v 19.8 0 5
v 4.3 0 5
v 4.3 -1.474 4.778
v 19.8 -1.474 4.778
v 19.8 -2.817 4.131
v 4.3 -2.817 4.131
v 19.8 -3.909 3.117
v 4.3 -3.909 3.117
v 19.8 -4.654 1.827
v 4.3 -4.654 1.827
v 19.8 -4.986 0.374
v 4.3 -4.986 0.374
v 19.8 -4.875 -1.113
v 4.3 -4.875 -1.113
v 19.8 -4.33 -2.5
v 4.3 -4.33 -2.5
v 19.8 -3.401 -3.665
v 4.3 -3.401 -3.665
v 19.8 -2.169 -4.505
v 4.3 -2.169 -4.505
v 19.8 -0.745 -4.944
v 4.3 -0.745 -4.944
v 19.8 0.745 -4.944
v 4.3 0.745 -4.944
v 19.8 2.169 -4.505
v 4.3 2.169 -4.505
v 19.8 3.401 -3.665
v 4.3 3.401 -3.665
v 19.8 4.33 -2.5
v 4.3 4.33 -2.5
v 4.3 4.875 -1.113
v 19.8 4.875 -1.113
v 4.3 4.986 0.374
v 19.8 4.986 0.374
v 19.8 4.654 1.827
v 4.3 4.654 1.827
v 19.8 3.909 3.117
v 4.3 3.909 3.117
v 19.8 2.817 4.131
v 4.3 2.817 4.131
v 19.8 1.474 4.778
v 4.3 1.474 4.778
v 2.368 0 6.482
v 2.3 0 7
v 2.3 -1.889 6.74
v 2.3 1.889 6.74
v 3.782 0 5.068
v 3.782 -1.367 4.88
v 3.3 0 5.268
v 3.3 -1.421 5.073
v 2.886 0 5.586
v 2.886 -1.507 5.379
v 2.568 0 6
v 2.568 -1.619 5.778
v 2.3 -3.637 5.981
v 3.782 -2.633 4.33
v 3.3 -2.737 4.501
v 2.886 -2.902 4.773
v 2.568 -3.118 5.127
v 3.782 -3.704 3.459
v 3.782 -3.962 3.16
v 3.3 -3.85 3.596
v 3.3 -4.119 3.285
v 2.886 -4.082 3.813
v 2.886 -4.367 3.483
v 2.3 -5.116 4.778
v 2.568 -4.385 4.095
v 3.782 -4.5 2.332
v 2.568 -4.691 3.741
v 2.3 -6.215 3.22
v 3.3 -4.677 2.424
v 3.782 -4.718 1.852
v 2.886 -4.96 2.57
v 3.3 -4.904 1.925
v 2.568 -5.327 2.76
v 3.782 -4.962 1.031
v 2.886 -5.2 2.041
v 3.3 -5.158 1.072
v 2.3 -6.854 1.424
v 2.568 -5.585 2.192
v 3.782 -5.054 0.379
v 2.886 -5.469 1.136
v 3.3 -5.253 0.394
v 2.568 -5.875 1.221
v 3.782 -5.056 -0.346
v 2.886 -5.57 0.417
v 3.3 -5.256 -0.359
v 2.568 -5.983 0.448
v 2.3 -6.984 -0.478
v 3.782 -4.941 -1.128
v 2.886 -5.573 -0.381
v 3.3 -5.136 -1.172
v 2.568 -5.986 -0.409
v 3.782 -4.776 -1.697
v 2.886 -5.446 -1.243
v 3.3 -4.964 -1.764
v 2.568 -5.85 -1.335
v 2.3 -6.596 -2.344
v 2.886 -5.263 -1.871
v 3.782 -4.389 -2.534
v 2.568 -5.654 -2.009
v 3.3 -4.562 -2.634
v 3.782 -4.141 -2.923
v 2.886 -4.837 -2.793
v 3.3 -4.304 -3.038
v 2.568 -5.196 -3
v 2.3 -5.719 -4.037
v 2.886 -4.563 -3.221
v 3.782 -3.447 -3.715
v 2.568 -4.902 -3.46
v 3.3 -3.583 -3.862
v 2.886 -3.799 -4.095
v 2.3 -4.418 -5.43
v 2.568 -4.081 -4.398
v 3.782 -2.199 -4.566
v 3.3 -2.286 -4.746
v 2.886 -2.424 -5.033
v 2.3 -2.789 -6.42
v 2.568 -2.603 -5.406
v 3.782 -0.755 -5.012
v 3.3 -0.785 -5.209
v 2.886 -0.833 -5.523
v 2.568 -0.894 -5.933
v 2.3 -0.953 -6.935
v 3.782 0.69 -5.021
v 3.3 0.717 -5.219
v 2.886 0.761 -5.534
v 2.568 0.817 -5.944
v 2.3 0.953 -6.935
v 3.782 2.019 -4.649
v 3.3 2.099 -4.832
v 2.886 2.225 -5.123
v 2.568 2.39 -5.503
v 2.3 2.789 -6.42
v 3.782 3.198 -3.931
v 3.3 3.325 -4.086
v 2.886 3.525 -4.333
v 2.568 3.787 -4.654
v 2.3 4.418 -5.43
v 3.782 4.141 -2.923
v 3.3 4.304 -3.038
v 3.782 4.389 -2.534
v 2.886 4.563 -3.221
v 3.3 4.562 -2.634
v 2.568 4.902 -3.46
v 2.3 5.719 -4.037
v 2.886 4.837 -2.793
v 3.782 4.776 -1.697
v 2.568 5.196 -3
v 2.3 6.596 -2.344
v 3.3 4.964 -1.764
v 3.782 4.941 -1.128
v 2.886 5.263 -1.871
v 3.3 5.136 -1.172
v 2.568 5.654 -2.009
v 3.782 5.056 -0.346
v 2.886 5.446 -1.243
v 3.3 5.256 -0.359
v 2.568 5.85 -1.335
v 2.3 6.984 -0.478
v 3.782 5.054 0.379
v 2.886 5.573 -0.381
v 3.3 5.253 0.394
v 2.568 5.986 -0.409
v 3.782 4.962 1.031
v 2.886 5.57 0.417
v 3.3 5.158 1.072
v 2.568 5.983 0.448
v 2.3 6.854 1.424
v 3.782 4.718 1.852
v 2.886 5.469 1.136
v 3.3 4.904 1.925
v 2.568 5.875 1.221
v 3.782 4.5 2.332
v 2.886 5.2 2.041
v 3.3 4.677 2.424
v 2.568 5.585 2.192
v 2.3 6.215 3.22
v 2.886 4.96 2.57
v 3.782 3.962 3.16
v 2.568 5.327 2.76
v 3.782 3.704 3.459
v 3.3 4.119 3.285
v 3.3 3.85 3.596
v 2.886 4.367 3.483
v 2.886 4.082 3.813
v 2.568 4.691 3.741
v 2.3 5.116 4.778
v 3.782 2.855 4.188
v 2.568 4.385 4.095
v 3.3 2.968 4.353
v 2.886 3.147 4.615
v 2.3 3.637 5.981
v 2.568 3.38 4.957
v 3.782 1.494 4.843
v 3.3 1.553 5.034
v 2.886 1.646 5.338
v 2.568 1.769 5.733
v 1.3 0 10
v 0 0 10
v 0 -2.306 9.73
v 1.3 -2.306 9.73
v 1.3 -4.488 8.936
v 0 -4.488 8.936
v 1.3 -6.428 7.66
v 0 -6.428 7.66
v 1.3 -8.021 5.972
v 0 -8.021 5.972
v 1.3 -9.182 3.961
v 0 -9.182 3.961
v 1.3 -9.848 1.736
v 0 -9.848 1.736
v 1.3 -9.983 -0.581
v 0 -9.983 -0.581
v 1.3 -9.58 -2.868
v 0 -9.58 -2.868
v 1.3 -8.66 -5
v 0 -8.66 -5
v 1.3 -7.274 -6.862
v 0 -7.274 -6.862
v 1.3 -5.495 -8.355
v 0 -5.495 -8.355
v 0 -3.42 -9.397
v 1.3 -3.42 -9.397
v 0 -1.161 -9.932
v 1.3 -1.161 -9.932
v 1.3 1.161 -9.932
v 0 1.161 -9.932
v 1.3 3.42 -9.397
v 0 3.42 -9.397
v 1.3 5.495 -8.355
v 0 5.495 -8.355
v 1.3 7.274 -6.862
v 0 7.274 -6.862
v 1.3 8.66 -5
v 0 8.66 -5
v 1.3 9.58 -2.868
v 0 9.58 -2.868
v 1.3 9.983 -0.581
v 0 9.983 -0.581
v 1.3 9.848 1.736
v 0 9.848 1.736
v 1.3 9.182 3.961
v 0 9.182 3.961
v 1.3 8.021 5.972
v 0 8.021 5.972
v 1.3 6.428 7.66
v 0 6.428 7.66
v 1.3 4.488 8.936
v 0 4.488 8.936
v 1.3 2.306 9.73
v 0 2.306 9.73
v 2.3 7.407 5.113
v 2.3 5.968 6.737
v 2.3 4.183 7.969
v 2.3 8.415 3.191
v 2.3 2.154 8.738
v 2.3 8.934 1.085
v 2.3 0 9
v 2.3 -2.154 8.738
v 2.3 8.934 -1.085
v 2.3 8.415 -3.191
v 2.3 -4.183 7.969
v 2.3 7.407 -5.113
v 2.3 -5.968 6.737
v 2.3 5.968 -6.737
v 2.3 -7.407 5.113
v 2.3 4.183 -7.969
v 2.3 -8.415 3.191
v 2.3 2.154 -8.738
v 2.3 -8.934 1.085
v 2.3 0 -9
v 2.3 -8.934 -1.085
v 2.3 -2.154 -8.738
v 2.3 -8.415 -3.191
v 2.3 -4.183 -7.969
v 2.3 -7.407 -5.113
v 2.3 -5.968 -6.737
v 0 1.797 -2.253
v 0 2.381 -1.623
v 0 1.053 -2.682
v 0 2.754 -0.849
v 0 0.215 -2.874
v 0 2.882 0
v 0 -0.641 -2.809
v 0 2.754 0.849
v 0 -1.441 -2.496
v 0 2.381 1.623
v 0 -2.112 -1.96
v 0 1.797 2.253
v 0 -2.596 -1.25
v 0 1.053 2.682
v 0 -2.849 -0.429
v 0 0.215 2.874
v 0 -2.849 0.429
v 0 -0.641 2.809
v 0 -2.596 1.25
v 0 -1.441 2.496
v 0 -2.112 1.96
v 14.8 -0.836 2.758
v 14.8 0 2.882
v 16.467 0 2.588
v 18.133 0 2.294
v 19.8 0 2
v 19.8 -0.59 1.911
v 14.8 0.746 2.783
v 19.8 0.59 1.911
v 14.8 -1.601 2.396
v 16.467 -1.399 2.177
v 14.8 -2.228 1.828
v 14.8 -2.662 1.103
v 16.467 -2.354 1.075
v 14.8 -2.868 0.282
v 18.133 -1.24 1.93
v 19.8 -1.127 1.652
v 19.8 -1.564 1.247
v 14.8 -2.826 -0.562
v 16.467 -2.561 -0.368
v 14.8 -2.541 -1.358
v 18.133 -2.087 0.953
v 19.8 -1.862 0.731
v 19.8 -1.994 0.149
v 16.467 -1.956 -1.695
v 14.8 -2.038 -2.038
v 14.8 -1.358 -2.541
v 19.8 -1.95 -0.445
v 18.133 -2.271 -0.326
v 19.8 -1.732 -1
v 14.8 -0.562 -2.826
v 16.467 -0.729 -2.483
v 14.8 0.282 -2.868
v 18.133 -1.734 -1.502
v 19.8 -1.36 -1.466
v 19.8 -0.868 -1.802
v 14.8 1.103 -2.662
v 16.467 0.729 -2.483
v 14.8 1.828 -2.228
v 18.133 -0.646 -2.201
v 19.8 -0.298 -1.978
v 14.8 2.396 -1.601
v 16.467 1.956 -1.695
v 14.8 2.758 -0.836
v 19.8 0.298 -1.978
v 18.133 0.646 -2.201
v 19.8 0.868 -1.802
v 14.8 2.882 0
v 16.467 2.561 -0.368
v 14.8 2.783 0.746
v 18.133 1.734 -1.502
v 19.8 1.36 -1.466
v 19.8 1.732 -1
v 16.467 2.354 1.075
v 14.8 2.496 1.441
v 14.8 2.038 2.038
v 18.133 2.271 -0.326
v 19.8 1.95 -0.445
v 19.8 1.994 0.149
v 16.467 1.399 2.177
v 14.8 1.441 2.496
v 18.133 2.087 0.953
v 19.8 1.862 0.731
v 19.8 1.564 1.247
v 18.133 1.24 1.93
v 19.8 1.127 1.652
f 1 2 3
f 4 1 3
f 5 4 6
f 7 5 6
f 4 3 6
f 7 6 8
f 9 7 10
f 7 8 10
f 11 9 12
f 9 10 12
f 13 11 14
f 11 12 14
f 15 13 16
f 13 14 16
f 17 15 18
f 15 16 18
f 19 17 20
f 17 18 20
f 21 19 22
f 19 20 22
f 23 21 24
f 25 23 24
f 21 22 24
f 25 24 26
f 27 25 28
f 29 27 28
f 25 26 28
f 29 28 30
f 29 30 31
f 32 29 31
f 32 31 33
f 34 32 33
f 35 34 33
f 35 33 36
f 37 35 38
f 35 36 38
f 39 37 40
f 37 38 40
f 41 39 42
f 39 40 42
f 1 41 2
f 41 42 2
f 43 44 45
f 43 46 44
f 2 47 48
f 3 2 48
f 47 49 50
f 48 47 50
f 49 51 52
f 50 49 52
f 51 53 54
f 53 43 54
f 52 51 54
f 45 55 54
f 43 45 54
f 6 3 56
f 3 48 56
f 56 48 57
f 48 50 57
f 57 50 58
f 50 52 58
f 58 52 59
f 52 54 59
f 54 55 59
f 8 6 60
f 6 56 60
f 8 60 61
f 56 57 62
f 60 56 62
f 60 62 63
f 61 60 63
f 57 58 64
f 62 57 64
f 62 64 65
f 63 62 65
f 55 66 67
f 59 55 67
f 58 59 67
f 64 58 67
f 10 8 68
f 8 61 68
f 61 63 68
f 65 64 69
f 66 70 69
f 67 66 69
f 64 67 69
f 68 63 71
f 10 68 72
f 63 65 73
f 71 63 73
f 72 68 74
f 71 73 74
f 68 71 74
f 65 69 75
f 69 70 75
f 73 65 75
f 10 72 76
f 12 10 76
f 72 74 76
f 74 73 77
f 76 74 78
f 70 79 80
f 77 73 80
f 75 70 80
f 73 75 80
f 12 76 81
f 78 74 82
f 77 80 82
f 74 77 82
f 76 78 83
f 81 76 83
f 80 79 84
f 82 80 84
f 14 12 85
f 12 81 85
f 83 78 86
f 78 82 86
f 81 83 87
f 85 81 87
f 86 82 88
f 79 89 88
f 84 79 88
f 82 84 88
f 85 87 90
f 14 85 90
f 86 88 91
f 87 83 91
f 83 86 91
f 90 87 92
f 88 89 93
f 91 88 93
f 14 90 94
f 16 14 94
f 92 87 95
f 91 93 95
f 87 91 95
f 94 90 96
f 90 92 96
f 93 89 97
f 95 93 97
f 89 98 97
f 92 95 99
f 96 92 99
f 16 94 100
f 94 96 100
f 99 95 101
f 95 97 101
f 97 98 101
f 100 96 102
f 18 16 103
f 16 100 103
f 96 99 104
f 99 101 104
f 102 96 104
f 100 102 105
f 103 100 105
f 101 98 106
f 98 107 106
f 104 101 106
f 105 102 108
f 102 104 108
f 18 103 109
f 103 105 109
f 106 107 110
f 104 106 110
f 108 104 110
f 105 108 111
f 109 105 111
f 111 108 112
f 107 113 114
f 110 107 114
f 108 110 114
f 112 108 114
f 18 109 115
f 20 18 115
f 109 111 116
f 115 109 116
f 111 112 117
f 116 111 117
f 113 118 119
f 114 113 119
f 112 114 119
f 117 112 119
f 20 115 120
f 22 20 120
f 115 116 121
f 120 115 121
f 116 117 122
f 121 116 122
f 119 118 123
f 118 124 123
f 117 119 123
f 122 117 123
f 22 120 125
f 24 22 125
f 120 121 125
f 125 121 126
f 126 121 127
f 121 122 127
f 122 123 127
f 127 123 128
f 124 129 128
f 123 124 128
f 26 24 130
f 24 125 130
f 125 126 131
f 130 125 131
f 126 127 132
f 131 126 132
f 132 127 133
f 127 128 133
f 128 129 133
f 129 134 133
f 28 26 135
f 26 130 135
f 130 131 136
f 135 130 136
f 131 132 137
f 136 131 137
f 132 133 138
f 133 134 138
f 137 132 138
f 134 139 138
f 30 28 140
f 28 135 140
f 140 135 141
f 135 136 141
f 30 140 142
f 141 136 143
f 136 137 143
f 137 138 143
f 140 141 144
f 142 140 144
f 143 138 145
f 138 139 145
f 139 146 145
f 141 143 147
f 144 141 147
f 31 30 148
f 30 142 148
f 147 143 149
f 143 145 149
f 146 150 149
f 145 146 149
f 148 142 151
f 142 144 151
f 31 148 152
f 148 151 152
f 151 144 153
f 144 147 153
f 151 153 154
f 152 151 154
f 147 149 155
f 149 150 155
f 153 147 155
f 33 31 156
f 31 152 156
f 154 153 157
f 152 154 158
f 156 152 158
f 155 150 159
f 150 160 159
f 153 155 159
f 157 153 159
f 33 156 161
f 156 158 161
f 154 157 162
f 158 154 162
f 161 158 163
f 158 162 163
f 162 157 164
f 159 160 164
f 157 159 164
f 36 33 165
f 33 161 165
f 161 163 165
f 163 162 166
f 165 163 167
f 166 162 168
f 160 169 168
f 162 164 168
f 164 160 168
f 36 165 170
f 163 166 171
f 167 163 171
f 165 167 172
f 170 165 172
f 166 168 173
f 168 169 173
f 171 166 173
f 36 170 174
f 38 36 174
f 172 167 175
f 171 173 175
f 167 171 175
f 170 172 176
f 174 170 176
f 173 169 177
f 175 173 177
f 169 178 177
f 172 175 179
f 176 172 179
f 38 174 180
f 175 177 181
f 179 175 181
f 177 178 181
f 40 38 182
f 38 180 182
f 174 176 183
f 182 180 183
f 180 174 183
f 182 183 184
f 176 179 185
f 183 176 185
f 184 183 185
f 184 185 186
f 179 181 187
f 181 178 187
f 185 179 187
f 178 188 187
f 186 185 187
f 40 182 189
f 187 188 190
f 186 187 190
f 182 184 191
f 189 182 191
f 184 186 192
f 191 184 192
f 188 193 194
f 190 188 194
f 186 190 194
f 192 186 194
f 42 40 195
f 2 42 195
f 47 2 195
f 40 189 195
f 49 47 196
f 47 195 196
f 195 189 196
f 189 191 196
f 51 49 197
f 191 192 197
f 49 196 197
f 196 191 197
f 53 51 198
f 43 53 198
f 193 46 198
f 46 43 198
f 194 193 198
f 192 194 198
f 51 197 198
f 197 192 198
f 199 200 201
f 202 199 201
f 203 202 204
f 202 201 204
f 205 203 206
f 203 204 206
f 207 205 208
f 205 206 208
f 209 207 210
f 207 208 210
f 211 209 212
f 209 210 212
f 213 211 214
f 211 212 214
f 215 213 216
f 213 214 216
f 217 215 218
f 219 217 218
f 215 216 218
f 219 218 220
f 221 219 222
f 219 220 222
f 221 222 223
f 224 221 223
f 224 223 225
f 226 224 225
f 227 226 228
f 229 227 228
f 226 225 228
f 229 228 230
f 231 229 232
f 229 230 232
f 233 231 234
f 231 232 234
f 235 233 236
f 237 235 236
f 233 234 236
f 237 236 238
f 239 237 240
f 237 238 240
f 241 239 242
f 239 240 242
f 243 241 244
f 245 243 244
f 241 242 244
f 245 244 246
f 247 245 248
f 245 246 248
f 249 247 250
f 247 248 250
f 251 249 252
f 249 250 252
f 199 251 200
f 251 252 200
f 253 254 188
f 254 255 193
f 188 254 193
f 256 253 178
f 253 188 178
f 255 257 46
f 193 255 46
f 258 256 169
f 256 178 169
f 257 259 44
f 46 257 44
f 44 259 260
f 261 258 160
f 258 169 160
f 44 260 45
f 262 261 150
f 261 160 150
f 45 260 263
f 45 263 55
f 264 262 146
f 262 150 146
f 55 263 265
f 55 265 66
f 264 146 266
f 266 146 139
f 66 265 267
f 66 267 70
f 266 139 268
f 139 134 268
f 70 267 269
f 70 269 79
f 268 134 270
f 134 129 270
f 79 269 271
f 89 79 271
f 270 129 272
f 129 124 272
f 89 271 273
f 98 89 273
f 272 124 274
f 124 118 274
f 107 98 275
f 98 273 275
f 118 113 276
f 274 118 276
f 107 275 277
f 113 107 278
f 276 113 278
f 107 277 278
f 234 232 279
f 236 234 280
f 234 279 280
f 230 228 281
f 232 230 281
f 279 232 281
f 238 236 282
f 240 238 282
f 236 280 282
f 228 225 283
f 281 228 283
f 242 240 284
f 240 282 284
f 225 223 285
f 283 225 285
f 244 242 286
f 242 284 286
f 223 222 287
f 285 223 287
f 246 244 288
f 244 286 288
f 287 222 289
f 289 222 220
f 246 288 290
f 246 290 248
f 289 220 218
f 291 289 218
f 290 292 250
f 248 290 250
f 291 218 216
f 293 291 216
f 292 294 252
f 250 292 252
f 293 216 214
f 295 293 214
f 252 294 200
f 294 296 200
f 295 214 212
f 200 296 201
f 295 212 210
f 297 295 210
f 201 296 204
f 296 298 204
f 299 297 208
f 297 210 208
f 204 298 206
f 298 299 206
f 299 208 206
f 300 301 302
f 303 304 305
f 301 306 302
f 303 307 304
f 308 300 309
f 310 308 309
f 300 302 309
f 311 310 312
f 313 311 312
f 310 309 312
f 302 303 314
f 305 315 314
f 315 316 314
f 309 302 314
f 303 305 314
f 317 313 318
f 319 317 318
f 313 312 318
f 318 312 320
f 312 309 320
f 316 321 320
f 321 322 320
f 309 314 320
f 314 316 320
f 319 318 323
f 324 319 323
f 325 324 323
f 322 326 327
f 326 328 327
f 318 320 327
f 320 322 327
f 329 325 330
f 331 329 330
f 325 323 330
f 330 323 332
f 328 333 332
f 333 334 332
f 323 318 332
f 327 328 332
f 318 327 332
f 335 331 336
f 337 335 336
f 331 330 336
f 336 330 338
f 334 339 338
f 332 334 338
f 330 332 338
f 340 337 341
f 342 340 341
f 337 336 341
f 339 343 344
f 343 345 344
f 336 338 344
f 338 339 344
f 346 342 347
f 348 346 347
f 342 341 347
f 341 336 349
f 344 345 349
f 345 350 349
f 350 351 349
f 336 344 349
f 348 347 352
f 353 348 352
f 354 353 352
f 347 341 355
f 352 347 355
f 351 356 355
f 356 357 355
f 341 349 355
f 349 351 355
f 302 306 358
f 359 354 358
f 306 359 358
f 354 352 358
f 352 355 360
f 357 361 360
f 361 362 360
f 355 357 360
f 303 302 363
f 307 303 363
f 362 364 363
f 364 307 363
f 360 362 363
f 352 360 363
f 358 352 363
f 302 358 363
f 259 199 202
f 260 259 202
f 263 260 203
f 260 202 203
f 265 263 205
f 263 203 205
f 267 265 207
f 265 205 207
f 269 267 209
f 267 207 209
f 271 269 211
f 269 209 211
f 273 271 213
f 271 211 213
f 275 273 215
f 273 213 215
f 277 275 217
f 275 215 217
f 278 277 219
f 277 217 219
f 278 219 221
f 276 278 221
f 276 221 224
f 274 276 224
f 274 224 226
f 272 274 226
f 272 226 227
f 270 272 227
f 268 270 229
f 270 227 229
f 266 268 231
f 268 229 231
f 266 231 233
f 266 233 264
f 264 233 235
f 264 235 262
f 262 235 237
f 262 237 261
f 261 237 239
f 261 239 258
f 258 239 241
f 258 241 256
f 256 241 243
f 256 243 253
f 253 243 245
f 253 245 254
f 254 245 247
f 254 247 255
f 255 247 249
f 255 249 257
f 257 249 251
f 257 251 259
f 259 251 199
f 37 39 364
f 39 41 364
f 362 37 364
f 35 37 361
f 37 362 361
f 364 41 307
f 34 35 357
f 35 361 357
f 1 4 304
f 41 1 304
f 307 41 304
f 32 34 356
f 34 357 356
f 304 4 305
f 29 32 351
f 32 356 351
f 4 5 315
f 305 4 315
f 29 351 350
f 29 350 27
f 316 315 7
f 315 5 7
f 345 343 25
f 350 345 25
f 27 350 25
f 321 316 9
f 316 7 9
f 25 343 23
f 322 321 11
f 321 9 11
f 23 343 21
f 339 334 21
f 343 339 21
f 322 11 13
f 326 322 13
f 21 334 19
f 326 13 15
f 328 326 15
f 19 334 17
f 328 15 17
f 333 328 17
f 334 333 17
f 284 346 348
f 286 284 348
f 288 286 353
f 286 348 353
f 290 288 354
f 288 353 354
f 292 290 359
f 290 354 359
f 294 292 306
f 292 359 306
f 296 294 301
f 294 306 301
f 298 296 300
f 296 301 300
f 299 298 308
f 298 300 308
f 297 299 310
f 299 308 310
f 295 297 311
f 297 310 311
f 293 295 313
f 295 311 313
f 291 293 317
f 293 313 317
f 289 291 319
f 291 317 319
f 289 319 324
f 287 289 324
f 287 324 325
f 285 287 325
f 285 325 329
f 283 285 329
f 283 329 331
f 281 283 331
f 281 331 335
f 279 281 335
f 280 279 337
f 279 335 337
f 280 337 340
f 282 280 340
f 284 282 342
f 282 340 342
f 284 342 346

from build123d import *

# Parameters (mm, degrees)
F2_R      = 2
F3_SIZE   = 1
F1_FACE_R = 2.881635
F4_DEPTH  = 25


with BuildPart() as f1:
    # F0 (on Front) → F1 (revolve)
    with BuildSketch(Plane.XZ):
        Polygon((0, 10), (0, 0), (2.3, 0), (2.3, 5), (2.3, 10), align=None)
        Polygon((2.3, 5), (2.3, 0), (14.8, 0), (14.8, 2.881635), (19.8, 2), (19.8, 5), align=None)
    revolve(axis=Axis((11.05, 0, 0), (1, 0, 0)))

    # F2
    f2_edges = [f1.edges().sort_by_distance(p)[0] for p in [
        (2.3, 0, -5),
    ]]
    fillet(f2_edges, radius=F2_R)

    # F3
    f3_edges = [f1.edges().sort_by_distance(p)[0] for p in [
        (2.3, 0, -10),
    ]]
    chamfer(f3_edges, length=F3_SIZE)

    # F1_face (on face) → F4 (cut)
    with BuildSketch(Plane.YZ.offset(14.8)):
        Circle(F1_FACE_R)
    extrude(amount=-F4_DEPTH, mode=Mode.SUBTRACT)


solid = f1.part
